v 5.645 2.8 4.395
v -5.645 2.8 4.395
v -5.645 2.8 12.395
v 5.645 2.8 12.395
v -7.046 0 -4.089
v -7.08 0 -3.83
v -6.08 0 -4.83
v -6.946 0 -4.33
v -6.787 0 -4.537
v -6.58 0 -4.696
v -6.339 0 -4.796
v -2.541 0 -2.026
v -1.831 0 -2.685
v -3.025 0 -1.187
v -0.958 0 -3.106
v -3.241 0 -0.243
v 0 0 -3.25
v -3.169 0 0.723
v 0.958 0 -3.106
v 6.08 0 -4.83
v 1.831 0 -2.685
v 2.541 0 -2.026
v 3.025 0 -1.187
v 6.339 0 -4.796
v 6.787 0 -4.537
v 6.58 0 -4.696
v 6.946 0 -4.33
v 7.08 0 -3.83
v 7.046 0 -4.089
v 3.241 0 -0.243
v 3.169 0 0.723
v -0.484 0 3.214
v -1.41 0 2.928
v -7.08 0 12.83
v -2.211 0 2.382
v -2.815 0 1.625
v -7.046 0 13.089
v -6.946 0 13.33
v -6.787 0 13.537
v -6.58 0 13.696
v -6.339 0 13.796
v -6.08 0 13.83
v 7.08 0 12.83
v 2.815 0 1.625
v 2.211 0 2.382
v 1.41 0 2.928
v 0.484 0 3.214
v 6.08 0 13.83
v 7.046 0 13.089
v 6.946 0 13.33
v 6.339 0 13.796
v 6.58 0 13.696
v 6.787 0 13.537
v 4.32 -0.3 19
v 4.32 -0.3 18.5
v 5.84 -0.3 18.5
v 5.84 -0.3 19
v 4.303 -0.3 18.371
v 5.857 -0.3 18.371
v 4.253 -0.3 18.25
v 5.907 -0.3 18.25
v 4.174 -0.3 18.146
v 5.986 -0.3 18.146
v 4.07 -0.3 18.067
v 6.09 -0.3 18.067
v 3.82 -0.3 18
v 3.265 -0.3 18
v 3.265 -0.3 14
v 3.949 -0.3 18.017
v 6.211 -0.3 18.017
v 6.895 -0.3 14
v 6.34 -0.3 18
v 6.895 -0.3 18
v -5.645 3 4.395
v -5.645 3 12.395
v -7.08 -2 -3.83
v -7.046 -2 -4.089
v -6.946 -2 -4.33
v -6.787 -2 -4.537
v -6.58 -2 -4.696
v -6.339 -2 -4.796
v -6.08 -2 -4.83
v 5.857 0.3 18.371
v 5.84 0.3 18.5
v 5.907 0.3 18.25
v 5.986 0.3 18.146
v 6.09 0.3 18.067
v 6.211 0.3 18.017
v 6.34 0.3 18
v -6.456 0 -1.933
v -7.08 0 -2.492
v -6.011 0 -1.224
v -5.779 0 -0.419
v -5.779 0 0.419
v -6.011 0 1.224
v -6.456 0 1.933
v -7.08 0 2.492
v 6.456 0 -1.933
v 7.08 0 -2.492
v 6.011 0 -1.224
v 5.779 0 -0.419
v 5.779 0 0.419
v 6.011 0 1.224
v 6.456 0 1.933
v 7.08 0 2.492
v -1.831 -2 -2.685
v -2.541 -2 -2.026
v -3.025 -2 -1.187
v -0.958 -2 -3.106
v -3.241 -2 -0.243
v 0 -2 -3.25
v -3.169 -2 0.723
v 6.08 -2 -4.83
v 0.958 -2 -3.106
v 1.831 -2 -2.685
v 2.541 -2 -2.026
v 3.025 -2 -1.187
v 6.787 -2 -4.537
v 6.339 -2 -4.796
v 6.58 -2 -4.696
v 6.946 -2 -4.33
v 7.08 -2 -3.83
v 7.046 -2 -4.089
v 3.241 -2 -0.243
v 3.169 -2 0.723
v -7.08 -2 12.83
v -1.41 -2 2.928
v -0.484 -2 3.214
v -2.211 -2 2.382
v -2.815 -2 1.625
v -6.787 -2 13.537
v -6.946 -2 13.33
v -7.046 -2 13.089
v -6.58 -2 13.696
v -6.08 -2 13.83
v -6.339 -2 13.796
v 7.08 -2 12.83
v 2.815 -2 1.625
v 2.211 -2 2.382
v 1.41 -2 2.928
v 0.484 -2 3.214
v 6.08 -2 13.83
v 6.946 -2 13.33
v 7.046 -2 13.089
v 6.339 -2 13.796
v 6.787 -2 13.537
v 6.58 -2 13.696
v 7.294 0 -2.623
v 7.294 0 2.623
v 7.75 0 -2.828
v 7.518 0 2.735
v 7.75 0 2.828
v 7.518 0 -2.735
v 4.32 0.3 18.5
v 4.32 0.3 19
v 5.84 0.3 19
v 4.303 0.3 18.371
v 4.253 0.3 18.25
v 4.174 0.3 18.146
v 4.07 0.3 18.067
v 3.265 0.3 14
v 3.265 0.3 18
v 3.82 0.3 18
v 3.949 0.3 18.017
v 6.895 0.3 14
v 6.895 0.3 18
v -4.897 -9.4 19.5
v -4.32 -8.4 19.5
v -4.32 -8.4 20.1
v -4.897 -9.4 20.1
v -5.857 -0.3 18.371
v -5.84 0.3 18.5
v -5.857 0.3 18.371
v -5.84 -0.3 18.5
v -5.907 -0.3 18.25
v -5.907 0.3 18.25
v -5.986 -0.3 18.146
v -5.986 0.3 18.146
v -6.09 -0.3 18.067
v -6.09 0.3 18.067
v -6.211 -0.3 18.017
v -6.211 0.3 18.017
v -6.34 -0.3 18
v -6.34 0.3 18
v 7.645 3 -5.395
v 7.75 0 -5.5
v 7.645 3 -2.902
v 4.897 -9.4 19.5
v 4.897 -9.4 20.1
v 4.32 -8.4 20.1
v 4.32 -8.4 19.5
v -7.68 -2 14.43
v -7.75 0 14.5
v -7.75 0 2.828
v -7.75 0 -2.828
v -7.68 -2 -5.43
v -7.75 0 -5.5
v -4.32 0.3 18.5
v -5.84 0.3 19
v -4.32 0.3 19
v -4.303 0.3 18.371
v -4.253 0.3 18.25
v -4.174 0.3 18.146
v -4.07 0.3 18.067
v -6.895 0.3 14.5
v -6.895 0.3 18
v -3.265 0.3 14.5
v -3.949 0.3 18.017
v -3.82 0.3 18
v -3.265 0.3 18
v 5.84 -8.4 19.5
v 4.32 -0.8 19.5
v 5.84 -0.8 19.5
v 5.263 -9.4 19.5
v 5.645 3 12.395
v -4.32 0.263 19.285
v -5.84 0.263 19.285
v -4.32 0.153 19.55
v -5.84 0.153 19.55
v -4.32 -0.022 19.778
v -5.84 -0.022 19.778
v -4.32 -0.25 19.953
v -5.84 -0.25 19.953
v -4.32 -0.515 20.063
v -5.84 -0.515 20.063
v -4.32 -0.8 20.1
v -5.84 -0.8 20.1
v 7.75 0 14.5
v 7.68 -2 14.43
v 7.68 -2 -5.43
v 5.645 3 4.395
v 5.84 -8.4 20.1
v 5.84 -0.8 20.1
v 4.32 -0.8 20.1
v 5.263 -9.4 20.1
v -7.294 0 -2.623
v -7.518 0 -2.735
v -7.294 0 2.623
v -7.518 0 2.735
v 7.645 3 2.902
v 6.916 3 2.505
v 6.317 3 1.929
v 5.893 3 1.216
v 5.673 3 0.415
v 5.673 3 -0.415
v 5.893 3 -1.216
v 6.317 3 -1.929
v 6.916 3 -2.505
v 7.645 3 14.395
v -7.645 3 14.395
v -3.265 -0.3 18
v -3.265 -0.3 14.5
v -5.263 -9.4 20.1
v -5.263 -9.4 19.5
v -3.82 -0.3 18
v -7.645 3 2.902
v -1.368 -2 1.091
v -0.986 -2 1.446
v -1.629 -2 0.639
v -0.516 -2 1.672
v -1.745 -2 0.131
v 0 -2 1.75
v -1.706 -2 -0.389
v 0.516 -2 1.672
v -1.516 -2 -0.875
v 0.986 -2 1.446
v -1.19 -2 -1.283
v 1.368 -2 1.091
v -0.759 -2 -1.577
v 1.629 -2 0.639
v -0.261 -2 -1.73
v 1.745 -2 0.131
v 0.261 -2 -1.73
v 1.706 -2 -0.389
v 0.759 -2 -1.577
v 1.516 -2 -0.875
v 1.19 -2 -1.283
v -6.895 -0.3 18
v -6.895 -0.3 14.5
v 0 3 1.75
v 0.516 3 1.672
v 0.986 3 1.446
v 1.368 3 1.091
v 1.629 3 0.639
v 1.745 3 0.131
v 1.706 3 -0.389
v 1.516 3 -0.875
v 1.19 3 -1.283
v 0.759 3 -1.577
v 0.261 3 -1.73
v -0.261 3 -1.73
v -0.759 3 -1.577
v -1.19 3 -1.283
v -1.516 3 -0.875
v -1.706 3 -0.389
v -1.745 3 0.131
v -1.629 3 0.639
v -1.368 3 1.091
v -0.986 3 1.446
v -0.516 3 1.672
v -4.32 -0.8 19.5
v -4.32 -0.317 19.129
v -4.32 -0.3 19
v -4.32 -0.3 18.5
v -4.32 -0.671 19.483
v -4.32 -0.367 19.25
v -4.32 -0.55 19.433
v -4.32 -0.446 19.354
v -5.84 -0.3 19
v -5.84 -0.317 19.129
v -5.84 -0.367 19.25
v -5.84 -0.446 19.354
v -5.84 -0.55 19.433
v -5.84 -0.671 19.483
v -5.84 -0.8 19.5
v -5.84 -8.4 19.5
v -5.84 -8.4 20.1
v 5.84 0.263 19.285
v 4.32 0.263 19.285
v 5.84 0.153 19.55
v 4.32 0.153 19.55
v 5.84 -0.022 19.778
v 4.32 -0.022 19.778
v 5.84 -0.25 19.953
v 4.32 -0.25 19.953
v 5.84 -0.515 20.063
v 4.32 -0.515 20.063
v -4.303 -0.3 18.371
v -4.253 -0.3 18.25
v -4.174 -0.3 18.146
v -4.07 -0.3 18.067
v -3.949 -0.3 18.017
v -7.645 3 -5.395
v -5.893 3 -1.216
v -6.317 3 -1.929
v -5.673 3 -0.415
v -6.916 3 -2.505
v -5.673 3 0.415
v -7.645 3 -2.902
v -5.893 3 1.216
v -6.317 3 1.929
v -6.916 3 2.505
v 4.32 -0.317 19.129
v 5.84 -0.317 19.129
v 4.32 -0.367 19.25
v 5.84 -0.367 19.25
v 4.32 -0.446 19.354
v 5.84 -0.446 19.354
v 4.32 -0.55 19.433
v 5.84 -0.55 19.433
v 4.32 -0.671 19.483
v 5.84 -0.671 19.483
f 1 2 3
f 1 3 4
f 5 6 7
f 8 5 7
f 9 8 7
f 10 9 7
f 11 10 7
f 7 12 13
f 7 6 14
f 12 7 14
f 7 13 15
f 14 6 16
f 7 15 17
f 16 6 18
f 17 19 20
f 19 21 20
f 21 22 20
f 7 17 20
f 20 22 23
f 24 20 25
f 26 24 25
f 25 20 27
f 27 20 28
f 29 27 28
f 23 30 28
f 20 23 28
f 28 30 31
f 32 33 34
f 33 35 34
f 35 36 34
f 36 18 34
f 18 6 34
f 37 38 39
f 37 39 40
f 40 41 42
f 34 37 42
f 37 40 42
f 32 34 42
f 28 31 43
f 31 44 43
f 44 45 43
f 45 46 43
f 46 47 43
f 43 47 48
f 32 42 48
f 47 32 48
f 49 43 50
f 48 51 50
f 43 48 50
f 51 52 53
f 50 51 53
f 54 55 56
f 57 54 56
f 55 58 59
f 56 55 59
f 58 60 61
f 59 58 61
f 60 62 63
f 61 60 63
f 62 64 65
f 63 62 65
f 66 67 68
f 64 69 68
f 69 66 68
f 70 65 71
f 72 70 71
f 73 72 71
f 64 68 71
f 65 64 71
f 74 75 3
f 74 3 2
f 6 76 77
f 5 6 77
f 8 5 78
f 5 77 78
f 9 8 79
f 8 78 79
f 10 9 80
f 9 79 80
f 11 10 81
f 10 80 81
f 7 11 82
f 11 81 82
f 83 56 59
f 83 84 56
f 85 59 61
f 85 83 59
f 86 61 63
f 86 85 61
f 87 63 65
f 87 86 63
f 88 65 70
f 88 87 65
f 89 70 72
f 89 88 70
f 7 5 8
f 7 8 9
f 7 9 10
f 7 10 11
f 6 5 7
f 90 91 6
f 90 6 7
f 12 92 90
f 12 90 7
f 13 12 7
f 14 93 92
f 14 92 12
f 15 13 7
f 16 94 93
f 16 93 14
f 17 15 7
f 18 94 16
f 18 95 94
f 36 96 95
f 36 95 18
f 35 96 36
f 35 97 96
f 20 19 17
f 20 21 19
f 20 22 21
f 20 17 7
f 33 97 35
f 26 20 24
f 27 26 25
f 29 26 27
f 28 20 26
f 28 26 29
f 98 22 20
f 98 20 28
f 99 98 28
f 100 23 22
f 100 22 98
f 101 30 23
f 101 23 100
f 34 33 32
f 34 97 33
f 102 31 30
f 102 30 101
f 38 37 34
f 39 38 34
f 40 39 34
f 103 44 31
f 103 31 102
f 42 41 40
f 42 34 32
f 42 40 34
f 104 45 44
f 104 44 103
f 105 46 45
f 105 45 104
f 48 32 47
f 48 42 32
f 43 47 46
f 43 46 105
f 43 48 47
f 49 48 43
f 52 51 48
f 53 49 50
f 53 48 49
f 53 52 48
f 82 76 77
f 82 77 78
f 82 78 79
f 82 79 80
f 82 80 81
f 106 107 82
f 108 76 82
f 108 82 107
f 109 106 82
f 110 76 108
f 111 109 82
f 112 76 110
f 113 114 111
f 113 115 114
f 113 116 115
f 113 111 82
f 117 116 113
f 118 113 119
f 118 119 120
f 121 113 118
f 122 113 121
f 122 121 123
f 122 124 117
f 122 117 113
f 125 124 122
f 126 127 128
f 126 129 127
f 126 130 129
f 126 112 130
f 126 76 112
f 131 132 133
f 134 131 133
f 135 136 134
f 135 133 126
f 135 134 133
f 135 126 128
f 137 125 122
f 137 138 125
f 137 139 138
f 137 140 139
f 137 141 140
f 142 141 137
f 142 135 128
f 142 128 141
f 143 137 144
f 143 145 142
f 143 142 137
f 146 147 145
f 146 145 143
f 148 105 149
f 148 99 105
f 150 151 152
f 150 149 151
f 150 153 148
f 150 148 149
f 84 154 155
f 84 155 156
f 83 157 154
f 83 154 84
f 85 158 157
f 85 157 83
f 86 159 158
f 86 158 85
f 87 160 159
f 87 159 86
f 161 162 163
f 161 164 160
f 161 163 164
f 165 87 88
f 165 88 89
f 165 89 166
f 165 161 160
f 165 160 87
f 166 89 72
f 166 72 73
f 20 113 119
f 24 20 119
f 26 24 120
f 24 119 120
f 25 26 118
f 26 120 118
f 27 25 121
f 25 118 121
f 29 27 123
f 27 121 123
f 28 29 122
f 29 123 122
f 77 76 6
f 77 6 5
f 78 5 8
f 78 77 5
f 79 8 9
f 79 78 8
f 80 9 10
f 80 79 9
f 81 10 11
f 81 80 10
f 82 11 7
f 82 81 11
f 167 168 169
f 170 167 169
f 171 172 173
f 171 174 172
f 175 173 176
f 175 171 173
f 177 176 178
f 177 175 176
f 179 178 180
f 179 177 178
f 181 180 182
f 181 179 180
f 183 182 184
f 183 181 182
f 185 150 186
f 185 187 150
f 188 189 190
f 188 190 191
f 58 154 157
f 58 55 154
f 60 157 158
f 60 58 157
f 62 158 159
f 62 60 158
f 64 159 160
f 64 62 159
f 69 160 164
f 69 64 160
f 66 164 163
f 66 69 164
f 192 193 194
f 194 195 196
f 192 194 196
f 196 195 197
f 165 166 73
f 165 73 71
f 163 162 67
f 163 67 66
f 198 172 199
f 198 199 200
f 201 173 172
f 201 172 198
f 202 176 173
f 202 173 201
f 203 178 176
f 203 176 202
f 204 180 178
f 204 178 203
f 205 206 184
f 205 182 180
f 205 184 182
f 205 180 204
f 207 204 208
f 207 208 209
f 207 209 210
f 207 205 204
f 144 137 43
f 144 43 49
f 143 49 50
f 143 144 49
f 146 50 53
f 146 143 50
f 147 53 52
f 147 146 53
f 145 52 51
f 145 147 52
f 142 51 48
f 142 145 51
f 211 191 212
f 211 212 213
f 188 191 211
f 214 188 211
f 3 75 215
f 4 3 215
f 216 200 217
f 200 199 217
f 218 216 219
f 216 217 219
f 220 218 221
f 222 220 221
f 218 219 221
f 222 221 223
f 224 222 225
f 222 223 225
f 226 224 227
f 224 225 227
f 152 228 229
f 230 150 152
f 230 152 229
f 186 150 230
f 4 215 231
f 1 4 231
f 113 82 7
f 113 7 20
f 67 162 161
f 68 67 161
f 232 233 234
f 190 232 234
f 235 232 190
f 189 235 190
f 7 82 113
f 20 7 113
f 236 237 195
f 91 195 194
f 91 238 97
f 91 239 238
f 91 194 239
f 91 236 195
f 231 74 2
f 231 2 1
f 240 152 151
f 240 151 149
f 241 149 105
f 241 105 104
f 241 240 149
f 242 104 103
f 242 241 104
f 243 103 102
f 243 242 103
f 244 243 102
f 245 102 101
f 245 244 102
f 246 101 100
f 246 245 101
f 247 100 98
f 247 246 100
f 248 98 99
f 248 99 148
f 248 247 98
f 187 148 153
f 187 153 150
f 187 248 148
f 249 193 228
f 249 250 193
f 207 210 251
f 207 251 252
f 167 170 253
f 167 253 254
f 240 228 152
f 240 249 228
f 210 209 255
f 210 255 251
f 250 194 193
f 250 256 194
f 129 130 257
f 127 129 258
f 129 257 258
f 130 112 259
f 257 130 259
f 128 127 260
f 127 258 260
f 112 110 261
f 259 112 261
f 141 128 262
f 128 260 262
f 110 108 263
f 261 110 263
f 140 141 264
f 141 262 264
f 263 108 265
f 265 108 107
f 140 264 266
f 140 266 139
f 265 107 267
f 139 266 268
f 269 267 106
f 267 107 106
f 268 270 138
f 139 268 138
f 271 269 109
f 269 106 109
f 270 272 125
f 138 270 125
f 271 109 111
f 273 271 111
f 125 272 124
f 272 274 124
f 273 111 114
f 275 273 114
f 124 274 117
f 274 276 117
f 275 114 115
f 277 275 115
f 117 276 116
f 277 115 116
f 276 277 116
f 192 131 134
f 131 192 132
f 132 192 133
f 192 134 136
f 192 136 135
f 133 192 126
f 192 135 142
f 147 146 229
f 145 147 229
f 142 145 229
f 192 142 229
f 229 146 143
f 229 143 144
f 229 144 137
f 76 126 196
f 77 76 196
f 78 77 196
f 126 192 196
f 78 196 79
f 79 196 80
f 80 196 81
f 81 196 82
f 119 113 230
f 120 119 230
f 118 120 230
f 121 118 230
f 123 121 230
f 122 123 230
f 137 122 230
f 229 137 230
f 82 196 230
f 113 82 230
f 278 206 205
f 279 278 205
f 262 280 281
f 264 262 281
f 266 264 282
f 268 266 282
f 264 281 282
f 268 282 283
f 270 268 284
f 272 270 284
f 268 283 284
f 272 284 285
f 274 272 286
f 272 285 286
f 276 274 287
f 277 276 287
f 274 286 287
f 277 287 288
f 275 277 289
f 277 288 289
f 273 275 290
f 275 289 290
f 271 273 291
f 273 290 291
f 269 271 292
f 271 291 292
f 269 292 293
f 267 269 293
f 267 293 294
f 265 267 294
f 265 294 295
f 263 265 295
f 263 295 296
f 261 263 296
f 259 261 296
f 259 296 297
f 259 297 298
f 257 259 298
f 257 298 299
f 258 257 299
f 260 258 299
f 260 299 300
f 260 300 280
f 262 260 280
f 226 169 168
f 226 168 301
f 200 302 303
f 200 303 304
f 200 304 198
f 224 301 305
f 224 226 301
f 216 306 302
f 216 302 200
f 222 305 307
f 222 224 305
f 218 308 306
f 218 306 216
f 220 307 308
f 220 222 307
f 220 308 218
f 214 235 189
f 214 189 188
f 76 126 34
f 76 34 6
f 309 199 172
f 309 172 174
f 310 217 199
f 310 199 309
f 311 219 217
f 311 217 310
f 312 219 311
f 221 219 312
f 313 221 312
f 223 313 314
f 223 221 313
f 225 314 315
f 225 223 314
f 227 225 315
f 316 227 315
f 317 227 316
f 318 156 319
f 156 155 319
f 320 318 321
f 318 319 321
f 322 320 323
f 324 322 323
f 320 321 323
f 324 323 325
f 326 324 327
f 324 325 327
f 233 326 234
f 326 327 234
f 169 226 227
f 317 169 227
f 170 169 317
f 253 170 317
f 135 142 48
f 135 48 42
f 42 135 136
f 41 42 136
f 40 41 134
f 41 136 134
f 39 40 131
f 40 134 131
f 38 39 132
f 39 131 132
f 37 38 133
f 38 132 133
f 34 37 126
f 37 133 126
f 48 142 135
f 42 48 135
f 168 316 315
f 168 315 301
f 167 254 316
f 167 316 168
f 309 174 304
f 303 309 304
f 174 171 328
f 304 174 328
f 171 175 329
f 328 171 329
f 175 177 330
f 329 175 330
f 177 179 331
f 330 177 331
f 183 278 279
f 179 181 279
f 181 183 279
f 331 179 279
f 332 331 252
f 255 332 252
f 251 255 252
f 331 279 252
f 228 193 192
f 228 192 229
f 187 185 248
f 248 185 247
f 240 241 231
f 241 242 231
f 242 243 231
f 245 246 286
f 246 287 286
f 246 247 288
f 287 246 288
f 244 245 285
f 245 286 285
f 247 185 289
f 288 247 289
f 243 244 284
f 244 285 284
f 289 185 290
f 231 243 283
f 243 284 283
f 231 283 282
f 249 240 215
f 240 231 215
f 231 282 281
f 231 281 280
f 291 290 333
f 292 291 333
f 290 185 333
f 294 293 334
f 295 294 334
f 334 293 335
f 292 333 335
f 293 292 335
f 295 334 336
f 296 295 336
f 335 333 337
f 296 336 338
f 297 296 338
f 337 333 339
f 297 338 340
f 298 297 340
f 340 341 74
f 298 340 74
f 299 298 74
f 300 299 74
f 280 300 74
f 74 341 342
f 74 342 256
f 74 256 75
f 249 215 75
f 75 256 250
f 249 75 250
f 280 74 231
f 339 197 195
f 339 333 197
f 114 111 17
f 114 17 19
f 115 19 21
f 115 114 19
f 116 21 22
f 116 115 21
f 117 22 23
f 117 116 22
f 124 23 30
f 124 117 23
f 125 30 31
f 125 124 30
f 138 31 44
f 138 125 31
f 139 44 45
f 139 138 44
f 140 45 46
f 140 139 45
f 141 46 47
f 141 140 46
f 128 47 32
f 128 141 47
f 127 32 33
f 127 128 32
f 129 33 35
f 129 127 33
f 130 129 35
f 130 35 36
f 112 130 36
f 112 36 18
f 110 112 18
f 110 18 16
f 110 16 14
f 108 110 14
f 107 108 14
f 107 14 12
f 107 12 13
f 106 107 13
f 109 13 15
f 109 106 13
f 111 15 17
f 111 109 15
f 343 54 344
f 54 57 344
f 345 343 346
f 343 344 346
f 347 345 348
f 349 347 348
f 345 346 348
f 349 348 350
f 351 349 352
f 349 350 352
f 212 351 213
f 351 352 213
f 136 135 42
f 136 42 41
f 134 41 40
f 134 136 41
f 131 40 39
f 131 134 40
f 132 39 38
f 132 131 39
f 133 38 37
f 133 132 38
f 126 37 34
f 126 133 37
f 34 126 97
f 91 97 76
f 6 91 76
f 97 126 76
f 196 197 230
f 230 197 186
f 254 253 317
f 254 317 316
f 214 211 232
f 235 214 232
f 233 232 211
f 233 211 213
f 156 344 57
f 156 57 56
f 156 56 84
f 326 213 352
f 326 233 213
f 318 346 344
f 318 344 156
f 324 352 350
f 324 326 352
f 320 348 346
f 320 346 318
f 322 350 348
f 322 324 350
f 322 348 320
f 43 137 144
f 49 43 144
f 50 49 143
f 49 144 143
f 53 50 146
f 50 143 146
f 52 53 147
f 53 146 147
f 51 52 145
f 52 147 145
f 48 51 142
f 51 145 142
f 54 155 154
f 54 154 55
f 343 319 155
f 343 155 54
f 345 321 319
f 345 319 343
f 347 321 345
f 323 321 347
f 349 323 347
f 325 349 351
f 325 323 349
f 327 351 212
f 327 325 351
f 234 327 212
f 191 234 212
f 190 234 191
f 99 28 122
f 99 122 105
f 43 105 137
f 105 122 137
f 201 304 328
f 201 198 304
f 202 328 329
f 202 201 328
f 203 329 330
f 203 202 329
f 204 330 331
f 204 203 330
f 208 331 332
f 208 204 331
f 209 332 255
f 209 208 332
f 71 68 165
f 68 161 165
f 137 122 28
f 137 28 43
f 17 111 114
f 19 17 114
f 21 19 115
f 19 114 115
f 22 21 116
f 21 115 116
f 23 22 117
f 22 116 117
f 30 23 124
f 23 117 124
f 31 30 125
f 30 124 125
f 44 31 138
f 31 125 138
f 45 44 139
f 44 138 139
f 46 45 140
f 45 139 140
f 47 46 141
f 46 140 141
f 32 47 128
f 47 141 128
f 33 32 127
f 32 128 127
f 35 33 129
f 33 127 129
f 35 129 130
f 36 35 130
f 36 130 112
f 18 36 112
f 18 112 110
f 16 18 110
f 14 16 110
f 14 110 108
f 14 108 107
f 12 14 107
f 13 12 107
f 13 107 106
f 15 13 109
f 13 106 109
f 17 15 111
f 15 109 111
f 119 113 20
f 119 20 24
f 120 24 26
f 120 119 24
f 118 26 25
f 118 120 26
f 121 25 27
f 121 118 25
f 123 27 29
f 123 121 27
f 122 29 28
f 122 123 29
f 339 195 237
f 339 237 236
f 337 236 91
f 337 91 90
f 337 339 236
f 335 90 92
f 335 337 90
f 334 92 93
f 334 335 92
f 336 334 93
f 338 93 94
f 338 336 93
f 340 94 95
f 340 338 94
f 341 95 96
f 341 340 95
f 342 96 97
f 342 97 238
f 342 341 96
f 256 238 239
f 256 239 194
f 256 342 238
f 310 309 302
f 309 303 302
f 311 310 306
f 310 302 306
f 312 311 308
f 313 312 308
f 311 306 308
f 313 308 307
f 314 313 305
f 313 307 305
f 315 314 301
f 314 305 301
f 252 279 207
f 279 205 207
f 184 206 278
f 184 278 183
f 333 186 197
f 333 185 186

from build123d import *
from OCP.BRepFilletAPI import BRepFilletAPI_MakeChamfer

# Parameters (mm, degrees)
SKETCH1_W                   = 15.5
SKETCH1_H                   = 20
EXTRUDE1_DEPTH              = 2
EXTRUDE1_DRAFT              = -2
EXTRUDE2_DEPTH              = 3
EXTRUDE2_TAPER              = 2
SKETCH3_R                   = 1.75
EXTRUDE3_DEPTH              = 18.184658986
SKETCH4_W                   = 3.63
SKETCH4_H                   = 3.5
EXTRUDE4_DEPTH              = 0.3
SKETCH4_H_2                 = 4
EXTRUDE4_2_DEPTH            = 0.3
SKETCH5_W                   = 11.290475384
SKETCH5_H                   = 8
EXTRUDE5_DEPTH              = 0.2
SKETCH6_W                   = 1.52
SKETCH6_H                   = 0.6
CHAMFER1_SIZE               = 1
CHAMFER1_SIZE2              = 0.577350269
LPATTERN1_COUNT             = 2
LPATTERN1_PITCH             = 10.16
CHAMFER1_OF_LPATTERN1_SIZE  = 1
CHAMFER1_OF_LPATTERN1_SIZE2 = 0.577350269
SKETCH7_R                   = 3.25
CUT_EXTRUDE1_DEPTH          = 2
SKETCH8_R                   = 3.25
EXTRUDE7_DEPTH              = 2
FILLET2_R                   = 0.5
FILLET3_R                   = 0.5


with BuildPart() as part:
    # Sketch1 → Extrude1 (with draft: the straight prism first)
    with BuildSketch(Plane(origin=(0, 0, 0), x_dir=(1, 0, 0), z_dir=(0, 1, 0))):
        with Locations((0, -4.5)):
            Rectangle(SKETCH1_W, SKETCH1_H)
    extrude(amount=-EXTRUDE1_DEPTH)
    # Extrude1: the draft: its side faces are tilted about the plane it starts from
    extrude1_sides = [part.faces().sort_by_distance(p)[0] for p in [
        (7.75, -1, 4.5),
        (0, -1, -5.5),
        (-7.75, -1, 4.5),
        (0, -1, 14.5),
    ]]
    draft(extrude1_sides, Plane(origin=(0, 0, 0), x_dir=(1, 0, 0), z_dir=(0, 1, 0)), EXTRUDE1_DRAFT)

    # Sketch2 → Extrude2 (add)
    with BuildSketch(Plane(origin=(0, 0, 0), x_dir=(1, 0, 0), z_dir=(0, 1, 0))):
        with BuildLine():
            Line((-7.75, -2.828427125), (-7.75, -14.5))
            Line((-7.75, -14.5), (7.75, -14.5))
            Line((7.75, -14.5), (7.75, -2.828427125))
            ThreePointArc((7.75, -2.828427125), (5.75, 0), (7.75, 2.828427125))
            Line((7.75, 2.828427125), (7.75, 5.5))
            Line((7.75, 5.5), (-7.75, 5.5))
            Line((-7.75, 5.5), (-7.75, 2.828427125))
            ThreePointArc((-7.75, 2.828427125), (-5.75, 0), (-7.75, -2.828427125))
        make_face()
    extrude(amount=EXTRUDE2_DEPTH, taper=EXTRUDE2_TAPER)

    # Sketch3 → Extrude3 (cut, through all)
    with BuildSketch(Plane(origin=(0, 3, 0), x_dir=(1, 0, 0), z_dir=(0, 1, 0))):
        with Locations(Location((0, 0, 0), (0, 0, 270))):
            Circle(SKETCH3_R)
    extrude(amount=-EXTRUDE3_DEPTH, mode=Mode.SUBTRACT)

    # Sketch5 → Extrude5 (cut)
    with BuildSketch(Plane(origin=(0, 3, 0), x_dir=(1, 0, 0), z_dir=(0, 1, 0))):
        with Locations((0, -8.395237692)):
            Rectangle(SKETCH5_W, SKETCH5_H)
    extrude(amount=-EXTRUDE5_DEPTH, mode=Mode.SUBTRACT)

    # Sketch7 → Cut-Extrude1 (cut)
    with BuildSketch(Plane.XZ.offset(2)):
        with BuildLine():
            Line((-7.080158461, 12.830158461), (-7.080158461, -3.830158461))
            ThreePointArc((-7.080158461, -3.830158461), (-6.787265242, -4.537265242), (-6.080158461, -4.830158461))
            Line((-6.080158461, -4.830158461), (6.080158461, -4.830158461))
            ThreePointArc((6.080158461, -4.830158461), (6.787265242, -4.537265242), (7.080158461, -3.830158461))
            Line((7.080158461, -3.830158461), (7.080158461, 12.830158461))
            ThreePointArc((7.080158461, 12.830158461), (6.787265242, 13.537265242), (6.080158461, 13.830158461))
            Line((6.080158461, 13.830158461), (-6.080158461, 13.830158461))
            ThreePointArc((-6.080158461, 13.830158461), (-6.787265242, 13.537265242), (-7.080158461, 12.830158461))
        make_face()
        with Locations(Location((0, 0, 0), (0, 0, 270))):
            Circle(SKETCH7_R, mode=Mode.SUBTRACT)
    extrude(amount=-CUT_EXTRUDE1_DEPTH, mode=Mode.SUBTRACT)


with BuildPart() as body_2:
    # Sketch4 → Extrude4 (new, symmetric)
    with BuildSketch(Plane(origin=(0, 0, 0), x_dir=(1, 0, 0), z_dir=(0, 1, 0))):
        with Locations((-5.08, -16.25)):
            Rectangle(SKETCH4_W, SKETCH4_H)
    extrude(amount=EXTRUDE4_DEPTH, both=True)

    # Sweep1: sweep along a curve in space
    with BuildLine() as sweep1_path:
        Line((-5.5, 0, 18), (-5.5, 0, 19))
        ThreePointArc((-5.5, 0, 19), (-5.5, -0.234314575, 19.565685425), (-5.5, -0.8, 19.8))
        Line((-5.5, -0.8, 19.8), (-5.5, -9.4, 19.8))
    # Sketch6 → Sweep1 (sweep)
    with BuildSketch(Plane.XY.offset(18)):
        with Locations((-5.08, 0)):
            Rectangle(SKETCH6_W, SKETCH6_H)
    sweep1 = sweep(path=sweep1_path.line)

    # Chamfer1: one chamfer whose edges measure the first distance from different faces: ONE call of the kernel's chamfer builder (chamfer() names one face for all edges)
    chamfer1_edges_1 = [body_2.edges().sort_by_distance(p)[0] for p in [
        (-5.84, -9.4, 19.8),
    ]]
    chamfer1_side_1 = [body_2.faces().sort_by_distance(p)[0] for p in [
        (-5.84, -4.07081027, 19.649372357),
    ]]
    chamfer1_edges_2 = [body_2.edges().sort_by_distance(p)[0] for p in [
        (-4.32, -9.4, 19.8),
    ]]
    chamfer1_side_2 = [body_2.faces().sort_by_distance(p)[0] for p in [
        (-4.32, -4.07081027, 19.649372357),
    ]]
    chamfer1 = BRepFilletAPI_MakeChamfer(body_2.part.solid().wrapped)
    for e in chamfer1_edges_1:
        chamfer1.Add(CHAMFER1_SIZE, CHAMFER1_SIZE2, e.wrapped, chamfer1_side_1[0].wrapped)  # the first distance lies on this face
    for e in chamfer1_edges_2:
        chamfer1.Add(CHAMFER1_SIZE, CHAMFER1_SIZE2, e.wrapped, chamfer1_side_2[0].wrapped)  # the first distance lies on this face
    add(Compound.cast(chamfer1.Shape()), mode=Mode.REPLACE)

    # Fillet2
    fillet2_edges = [body_2.edges().sort_by_distance(p)[0] for p in [
        (-4.32, 0, 18),
        (-5.84, 0, 18),
    ]]
    fillet(fillet2_edges, radius=FILLET2_R)


with BuildPart() as body_3:
    # Sketch4 → Extrude4 2 (new, symmetric)
    with BuildSketch(Plane(origin=(0, 0, 0), x_dir=(1, 0, 0), z_dir=(0, 1, 0))):
        with Locations((5.08, -16)):
            Rectangle(SKETCH4_W, SKETCH4_H_2)
    extrude(amount=EXTRUDE4_2_DEPTH, both=True)

    # LPattern1: Sweep1 ×2
    with Locations(*[(i * LPATTERN1_PITCH, 0, 0) for i in range(1, LPATTERN1_COUNT)]):
        add(sweep1)

    # Chamfer1 of LPattern1: one chamfer whose edges measure the first distance from different faces: ONE call of the kernel's chamfer builder (chamfer() names one face for all edges)
    chamfer1_of_lpattern1_edges_1 = [body_3.edges().sort_by_distance(p)[0] for p in [
        (4.32, -9.4, 19.8),
    ]]
    chamfer1_of_lpattern1_side_1 = [body_3.faces().sort_by_distance(p)[0] for p in [
        (4.32, -4.07081027, 19.649372357),
    ]]
    chamfer1_of_lpattern1_edges_2 = [body_3.edges().sort_by_distance(p)[0] for p in [
        (5.84, -9.4, 19.8),
    ]]
    chamfer1_of_lpattern1_side_2 = [body_3.faces().sort_by_distance(p)[0] for p in [
        (5.84, -4.07081027, 19.649372357),
    ]]
    chamfer1_of_lpattern1 = BRepFilletAPI_MakeChamfer(body_3.part.solid().wrapped)
    for e in chamfer1_of_lpattern1_edges_1:
        chamfer1_of_lpattern1.Add(CHAMFER1_OF_LPATTERN1_SIZE, CHAMFER1_OF_LPATTERN1_SIZE2, e.wrapped, chamfer1_of_lpattern1_side_1[0].wrapped)  # the first distance lies on this face
    for e in chamfer1_of_lpattern1_edges_2:
        chamfer1_of_lpattern1.Add(CHAMFER1_OF_LPATTERN1_SIZE, CHAMFER1_OF_LPATTERN1_SIZE2, e.wrapped, chamfer1_of_lpattern1_side_2[0].wrapped)  # the first distance lies on this face
    add(Compound.cast(chamfer1_of_lpattern1.Shape()), mode=Mode.REPLACE)

    # Fillet3
    fillet3_edges = [body_3.edges().sort_by_distance(p)[0] for p in [
        (5.84, 0, 18),
        (4.32, 0, 18),
    ]]
    fillet(fillet3_edges, radius=FILLET3_R)


with BuildPart() as body_4:
    # Sketch8 → Extrude7 (new body)
    with BuildSketch(Plane.XZ.offset(2)):
        with BuildLine():
            Line((-7.080158461, 12.830158461), (-7.080158461, -3.830158461))
            ThreePointArc((-7.080158461, -3.830158461), (-6.787265242, -4.537265242), (-6.080158461, -4.830158461))
            Line((-6.080158461, -4.830158461), (6.080158461, -4.830158461))
            ThreePointArc((6.080158461, -4.830158461), (6.787265242, -4.537265242), (7.080158461, -3.830158461))
            Line((7.080158461, -3.830158461), (7.080158461, 12.830158461))
            ThreePointArc((7.080158461, 12.830158461), (6.787265242, 13.537265242), (6.080158461, 13.830158461))
            Line((6.080158461, 13.830158461), (-6.080158461, 13.830158461))
            ThreePointArc((-6.080158461, 13.830158461), (-6.787265242, 13.537265242), (-7.080158461, 12.830158461))
        make_face()
        with Locations(Location((0, 0, 0), (0, 0, 270))):
            Circle(SKETCH8_R, mode=Mode.SUBTRACT)
    extrude(amount=-EXTRUDE7_DEPTH)


solid = Compound([part.part, body_2.part, body_3.part, body_4.part])
